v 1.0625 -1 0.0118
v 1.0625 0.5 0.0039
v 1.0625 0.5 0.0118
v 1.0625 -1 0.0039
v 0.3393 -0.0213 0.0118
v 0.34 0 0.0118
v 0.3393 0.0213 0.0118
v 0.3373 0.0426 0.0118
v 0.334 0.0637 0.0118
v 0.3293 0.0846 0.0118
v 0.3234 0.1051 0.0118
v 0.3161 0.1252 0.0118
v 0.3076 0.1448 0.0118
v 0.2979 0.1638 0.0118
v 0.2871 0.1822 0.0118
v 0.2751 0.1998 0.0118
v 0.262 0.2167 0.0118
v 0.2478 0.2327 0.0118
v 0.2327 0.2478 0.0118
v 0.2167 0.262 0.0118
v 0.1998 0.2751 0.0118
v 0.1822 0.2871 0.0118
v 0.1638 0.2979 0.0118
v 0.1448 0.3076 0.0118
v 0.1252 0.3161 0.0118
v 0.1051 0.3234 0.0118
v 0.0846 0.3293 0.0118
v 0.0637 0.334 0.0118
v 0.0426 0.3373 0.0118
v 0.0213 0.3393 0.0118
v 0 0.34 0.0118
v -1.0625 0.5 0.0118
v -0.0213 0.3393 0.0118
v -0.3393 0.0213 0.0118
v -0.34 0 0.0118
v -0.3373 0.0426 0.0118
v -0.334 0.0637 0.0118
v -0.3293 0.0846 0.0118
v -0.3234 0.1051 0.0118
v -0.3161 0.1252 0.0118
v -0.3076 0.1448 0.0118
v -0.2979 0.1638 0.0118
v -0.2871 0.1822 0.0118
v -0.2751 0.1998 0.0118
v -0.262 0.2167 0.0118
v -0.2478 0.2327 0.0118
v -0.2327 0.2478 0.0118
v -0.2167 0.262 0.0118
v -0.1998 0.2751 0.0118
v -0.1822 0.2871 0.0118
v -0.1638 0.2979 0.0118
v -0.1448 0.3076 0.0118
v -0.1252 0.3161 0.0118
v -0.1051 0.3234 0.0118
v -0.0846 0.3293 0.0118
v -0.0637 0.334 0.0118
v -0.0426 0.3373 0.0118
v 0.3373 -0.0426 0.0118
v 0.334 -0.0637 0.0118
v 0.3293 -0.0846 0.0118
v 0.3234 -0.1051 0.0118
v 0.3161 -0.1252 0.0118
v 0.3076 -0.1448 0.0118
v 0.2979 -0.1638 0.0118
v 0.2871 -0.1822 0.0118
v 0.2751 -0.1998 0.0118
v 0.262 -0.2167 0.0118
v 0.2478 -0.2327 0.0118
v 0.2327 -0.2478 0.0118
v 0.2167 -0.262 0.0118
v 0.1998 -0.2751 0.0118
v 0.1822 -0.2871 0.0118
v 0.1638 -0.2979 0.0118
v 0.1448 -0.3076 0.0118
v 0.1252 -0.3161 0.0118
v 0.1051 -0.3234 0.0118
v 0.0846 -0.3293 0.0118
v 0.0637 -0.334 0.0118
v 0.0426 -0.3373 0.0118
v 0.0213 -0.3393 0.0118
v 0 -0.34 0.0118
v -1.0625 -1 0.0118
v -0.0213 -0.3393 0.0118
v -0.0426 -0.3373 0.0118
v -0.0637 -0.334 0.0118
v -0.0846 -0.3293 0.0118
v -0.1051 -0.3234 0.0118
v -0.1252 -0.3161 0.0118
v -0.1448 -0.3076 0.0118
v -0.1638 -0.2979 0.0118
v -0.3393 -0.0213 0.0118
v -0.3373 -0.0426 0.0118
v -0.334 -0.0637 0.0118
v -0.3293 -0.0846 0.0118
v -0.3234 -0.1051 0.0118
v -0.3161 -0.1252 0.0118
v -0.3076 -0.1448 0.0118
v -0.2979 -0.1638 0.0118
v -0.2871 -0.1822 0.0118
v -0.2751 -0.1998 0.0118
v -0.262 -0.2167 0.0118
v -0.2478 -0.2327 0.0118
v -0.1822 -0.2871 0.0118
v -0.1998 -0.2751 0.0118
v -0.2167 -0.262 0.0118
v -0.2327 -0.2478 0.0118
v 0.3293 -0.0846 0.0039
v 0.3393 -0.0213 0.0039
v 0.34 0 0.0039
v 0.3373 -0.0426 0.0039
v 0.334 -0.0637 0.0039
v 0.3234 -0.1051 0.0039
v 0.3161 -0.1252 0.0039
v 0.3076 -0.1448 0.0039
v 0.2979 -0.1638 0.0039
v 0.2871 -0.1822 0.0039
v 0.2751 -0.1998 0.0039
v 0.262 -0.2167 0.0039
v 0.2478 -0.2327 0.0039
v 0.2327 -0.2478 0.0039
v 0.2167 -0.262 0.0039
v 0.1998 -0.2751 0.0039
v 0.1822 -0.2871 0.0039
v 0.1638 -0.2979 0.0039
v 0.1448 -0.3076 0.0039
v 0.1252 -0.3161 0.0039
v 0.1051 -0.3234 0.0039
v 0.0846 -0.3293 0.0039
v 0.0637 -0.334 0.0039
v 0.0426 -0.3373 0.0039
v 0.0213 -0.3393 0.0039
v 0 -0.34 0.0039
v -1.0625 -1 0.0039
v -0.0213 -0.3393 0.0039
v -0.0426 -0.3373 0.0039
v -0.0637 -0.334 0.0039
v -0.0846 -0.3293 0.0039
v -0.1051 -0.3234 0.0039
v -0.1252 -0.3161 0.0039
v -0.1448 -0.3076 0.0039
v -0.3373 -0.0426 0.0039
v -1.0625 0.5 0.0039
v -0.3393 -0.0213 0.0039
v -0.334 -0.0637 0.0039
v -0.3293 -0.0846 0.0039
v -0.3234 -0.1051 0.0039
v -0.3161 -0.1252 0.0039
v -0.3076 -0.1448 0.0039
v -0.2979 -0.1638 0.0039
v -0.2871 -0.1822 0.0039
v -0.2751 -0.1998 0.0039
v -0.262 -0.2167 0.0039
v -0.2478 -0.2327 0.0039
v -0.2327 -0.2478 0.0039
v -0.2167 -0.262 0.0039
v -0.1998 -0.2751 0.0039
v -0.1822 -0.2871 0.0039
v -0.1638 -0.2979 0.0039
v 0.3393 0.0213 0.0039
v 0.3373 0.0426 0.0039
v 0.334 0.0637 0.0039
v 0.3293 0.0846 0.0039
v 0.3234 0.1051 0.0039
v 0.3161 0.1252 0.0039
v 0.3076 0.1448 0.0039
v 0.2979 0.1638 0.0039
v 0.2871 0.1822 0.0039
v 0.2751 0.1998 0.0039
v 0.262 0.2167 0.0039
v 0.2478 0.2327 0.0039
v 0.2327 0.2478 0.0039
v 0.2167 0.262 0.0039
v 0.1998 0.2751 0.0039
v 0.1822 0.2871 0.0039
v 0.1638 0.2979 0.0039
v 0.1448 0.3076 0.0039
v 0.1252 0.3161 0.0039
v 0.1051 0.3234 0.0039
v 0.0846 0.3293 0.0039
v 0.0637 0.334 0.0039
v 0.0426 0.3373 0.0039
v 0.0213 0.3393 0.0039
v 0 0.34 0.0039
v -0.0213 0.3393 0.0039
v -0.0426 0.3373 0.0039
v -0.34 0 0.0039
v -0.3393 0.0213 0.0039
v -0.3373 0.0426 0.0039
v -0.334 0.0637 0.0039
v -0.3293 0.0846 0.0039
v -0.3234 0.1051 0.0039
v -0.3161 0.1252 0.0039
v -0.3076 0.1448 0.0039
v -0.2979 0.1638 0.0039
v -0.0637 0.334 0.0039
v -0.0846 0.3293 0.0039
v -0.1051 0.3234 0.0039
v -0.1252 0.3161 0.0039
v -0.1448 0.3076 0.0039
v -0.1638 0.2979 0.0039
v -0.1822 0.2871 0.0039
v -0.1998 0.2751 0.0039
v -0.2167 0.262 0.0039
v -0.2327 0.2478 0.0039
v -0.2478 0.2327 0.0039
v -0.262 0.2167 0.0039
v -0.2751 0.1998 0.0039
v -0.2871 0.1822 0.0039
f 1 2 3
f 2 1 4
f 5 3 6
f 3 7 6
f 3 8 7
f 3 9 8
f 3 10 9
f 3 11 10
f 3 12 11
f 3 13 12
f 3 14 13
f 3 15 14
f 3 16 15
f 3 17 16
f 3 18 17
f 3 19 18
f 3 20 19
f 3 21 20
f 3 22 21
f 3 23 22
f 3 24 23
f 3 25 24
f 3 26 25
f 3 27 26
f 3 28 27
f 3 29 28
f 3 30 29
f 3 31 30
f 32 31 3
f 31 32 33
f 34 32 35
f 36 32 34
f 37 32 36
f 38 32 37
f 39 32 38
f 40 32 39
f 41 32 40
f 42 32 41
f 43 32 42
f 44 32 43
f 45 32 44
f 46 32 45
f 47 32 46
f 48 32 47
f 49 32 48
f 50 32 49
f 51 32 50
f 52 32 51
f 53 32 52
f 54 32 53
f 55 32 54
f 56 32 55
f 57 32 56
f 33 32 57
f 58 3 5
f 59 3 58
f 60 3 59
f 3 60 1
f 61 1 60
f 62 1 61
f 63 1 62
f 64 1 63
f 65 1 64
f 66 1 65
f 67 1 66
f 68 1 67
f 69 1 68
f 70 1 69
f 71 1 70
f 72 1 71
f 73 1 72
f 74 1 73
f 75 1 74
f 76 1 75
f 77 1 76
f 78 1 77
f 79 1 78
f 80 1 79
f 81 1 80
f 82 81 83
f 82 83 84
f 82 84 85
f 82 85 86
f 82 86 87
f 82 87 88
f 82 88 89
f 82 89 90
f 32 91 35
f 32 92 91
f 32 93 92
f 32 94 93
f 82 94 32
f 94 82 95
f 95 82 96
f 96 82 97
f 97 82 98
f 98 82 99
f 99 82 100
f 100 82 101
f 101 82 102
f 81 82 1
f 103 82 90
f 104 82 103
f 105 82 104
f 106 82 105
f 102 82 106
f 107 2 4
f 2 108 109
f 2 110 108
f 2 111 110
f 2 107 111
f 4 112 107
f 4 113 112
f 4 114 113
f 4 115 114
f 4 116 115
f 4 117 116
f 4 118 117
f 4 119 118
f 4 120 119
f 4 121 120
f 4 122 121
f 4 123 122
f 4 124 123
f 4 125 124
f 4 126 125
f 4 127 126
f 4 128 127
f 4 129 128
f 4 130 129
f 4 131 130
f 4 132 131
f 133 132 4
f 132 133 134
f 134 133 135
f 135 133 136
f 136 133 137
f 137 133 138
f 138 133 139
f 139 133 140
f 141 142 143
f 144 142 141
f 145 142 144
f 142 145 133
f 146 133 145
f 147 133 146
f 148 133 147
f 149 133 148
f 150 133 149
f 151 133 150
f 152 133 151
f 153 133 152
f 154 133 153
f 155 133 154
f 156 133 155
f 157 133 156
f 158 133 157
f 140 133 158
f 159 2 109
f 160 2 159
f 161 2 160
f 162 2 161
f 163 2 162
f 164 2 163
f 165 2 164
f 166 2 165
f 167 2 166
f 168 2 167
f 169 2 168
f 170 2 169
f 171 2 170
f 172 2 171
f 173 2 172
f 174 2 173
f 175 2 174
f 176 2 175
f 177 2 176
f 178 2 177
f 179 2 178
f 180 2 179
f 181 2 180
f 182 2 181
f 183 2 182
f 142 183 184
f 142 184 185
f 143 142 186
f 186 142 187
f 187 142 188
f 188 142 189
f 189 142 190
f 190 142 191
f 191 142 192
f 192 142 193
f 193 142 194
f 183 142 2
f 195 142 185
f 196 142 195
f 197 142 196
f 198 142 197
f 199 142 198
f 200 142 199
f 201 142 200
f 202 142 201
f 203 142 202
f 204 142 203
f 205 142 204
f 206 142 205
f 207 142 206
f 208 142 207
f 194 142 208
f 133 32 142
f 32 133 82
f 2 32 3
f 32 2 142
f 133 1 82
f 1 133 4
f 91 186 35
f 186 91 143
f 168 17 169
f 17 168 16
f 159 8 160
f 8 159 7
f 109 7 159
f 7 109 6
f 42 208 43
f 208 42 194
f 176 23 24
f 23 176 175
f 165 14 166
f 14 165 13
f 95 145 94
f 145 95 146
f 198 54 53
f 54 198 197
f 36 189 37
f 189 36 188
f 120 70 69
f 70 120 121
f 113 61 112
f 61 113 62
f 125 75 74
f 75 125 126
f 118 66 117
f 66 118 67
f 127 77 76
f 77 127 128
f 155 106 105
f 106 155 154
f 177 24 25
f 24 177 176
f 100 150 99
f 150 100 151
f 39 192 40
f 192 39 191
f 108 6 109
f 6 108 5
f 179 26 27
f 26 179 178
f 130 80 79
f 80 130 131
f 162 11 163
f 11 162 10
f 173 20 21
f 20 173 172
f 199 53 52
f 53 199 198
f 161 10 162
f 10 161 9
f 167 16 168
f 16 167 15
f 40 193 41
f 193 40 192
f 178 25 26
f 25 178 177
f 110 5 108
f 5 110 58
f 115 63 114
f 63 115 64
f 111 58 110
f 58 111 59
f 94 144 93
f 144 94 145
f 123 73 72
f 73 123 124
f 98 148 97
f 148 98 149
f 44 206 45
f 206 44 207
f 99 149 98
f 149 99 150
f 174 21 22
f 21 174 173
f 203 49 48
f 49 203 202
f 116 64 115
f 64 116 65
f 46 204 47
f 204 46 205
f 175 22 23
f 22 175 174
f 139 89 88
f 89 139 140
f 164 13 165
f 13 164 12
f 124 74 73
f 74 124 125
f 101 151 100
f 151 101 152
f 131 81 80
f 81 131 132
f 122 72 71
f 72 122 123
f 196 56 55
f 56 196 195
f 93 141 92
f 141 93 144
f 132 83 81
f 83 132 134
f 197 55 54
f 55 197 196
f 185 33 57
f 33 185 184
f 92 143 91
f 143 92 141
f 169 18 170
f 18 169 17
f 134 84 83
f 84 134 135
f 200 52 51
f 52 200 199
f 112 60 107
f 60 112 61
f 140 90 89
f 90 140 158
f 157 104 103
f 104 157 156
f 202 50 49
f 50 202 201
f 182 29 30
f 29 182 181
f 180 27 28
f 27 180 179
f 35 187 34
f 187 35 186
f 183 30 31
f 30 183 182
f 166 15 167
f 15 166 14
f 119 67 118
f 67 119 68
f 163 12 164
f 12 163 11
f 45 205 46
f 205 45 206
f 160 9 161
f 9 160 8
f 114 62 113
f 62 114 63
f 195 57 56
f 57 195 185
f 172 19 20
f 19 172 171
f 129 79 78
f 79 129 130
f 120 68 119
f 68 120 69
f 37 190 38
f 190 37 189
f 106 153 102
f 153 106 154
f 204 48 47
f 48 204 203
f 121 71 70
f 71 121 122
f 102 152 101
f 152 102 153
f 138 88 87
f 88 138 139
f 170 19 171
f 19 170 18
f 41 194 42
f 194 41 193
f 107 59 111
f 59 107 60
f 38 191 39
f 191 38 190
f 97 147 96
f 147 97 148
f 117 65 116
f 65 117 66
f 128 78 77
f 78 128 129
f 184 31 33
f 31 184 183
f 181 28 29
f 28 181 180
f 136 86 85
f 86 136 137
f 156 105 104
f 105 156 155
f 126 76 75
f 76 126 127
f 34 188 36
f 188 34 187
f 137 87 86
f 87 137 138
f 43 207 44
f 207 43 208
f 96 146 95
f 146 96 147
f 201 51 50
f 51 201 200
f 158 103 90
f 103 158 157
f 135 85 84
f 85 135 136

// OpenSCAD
label_text = "";

mm_to_in = 0.03937805;
layer_height = .2 * mm_to_in;

text_size = 0.35;
text_height = layer_height * 3;
text_x = 0;
text_y = -.75;

union() {
    translate([text_x, text_y, layer_height])
        linear_extrude(height = text_height)
            text(
                label_text,
                size = text_size,
                halign = "center",
                valign = "center"
            );
    
    difference() {
        translate([0, -0.25, 1 * layer_height])
            cube([2.125, 1.5, layer_height], center = true);
        translate([0, 0, layer_height])
            cylinder(height = layer_height, r = 0.34, $fn = 100, center = true);
    }
}
